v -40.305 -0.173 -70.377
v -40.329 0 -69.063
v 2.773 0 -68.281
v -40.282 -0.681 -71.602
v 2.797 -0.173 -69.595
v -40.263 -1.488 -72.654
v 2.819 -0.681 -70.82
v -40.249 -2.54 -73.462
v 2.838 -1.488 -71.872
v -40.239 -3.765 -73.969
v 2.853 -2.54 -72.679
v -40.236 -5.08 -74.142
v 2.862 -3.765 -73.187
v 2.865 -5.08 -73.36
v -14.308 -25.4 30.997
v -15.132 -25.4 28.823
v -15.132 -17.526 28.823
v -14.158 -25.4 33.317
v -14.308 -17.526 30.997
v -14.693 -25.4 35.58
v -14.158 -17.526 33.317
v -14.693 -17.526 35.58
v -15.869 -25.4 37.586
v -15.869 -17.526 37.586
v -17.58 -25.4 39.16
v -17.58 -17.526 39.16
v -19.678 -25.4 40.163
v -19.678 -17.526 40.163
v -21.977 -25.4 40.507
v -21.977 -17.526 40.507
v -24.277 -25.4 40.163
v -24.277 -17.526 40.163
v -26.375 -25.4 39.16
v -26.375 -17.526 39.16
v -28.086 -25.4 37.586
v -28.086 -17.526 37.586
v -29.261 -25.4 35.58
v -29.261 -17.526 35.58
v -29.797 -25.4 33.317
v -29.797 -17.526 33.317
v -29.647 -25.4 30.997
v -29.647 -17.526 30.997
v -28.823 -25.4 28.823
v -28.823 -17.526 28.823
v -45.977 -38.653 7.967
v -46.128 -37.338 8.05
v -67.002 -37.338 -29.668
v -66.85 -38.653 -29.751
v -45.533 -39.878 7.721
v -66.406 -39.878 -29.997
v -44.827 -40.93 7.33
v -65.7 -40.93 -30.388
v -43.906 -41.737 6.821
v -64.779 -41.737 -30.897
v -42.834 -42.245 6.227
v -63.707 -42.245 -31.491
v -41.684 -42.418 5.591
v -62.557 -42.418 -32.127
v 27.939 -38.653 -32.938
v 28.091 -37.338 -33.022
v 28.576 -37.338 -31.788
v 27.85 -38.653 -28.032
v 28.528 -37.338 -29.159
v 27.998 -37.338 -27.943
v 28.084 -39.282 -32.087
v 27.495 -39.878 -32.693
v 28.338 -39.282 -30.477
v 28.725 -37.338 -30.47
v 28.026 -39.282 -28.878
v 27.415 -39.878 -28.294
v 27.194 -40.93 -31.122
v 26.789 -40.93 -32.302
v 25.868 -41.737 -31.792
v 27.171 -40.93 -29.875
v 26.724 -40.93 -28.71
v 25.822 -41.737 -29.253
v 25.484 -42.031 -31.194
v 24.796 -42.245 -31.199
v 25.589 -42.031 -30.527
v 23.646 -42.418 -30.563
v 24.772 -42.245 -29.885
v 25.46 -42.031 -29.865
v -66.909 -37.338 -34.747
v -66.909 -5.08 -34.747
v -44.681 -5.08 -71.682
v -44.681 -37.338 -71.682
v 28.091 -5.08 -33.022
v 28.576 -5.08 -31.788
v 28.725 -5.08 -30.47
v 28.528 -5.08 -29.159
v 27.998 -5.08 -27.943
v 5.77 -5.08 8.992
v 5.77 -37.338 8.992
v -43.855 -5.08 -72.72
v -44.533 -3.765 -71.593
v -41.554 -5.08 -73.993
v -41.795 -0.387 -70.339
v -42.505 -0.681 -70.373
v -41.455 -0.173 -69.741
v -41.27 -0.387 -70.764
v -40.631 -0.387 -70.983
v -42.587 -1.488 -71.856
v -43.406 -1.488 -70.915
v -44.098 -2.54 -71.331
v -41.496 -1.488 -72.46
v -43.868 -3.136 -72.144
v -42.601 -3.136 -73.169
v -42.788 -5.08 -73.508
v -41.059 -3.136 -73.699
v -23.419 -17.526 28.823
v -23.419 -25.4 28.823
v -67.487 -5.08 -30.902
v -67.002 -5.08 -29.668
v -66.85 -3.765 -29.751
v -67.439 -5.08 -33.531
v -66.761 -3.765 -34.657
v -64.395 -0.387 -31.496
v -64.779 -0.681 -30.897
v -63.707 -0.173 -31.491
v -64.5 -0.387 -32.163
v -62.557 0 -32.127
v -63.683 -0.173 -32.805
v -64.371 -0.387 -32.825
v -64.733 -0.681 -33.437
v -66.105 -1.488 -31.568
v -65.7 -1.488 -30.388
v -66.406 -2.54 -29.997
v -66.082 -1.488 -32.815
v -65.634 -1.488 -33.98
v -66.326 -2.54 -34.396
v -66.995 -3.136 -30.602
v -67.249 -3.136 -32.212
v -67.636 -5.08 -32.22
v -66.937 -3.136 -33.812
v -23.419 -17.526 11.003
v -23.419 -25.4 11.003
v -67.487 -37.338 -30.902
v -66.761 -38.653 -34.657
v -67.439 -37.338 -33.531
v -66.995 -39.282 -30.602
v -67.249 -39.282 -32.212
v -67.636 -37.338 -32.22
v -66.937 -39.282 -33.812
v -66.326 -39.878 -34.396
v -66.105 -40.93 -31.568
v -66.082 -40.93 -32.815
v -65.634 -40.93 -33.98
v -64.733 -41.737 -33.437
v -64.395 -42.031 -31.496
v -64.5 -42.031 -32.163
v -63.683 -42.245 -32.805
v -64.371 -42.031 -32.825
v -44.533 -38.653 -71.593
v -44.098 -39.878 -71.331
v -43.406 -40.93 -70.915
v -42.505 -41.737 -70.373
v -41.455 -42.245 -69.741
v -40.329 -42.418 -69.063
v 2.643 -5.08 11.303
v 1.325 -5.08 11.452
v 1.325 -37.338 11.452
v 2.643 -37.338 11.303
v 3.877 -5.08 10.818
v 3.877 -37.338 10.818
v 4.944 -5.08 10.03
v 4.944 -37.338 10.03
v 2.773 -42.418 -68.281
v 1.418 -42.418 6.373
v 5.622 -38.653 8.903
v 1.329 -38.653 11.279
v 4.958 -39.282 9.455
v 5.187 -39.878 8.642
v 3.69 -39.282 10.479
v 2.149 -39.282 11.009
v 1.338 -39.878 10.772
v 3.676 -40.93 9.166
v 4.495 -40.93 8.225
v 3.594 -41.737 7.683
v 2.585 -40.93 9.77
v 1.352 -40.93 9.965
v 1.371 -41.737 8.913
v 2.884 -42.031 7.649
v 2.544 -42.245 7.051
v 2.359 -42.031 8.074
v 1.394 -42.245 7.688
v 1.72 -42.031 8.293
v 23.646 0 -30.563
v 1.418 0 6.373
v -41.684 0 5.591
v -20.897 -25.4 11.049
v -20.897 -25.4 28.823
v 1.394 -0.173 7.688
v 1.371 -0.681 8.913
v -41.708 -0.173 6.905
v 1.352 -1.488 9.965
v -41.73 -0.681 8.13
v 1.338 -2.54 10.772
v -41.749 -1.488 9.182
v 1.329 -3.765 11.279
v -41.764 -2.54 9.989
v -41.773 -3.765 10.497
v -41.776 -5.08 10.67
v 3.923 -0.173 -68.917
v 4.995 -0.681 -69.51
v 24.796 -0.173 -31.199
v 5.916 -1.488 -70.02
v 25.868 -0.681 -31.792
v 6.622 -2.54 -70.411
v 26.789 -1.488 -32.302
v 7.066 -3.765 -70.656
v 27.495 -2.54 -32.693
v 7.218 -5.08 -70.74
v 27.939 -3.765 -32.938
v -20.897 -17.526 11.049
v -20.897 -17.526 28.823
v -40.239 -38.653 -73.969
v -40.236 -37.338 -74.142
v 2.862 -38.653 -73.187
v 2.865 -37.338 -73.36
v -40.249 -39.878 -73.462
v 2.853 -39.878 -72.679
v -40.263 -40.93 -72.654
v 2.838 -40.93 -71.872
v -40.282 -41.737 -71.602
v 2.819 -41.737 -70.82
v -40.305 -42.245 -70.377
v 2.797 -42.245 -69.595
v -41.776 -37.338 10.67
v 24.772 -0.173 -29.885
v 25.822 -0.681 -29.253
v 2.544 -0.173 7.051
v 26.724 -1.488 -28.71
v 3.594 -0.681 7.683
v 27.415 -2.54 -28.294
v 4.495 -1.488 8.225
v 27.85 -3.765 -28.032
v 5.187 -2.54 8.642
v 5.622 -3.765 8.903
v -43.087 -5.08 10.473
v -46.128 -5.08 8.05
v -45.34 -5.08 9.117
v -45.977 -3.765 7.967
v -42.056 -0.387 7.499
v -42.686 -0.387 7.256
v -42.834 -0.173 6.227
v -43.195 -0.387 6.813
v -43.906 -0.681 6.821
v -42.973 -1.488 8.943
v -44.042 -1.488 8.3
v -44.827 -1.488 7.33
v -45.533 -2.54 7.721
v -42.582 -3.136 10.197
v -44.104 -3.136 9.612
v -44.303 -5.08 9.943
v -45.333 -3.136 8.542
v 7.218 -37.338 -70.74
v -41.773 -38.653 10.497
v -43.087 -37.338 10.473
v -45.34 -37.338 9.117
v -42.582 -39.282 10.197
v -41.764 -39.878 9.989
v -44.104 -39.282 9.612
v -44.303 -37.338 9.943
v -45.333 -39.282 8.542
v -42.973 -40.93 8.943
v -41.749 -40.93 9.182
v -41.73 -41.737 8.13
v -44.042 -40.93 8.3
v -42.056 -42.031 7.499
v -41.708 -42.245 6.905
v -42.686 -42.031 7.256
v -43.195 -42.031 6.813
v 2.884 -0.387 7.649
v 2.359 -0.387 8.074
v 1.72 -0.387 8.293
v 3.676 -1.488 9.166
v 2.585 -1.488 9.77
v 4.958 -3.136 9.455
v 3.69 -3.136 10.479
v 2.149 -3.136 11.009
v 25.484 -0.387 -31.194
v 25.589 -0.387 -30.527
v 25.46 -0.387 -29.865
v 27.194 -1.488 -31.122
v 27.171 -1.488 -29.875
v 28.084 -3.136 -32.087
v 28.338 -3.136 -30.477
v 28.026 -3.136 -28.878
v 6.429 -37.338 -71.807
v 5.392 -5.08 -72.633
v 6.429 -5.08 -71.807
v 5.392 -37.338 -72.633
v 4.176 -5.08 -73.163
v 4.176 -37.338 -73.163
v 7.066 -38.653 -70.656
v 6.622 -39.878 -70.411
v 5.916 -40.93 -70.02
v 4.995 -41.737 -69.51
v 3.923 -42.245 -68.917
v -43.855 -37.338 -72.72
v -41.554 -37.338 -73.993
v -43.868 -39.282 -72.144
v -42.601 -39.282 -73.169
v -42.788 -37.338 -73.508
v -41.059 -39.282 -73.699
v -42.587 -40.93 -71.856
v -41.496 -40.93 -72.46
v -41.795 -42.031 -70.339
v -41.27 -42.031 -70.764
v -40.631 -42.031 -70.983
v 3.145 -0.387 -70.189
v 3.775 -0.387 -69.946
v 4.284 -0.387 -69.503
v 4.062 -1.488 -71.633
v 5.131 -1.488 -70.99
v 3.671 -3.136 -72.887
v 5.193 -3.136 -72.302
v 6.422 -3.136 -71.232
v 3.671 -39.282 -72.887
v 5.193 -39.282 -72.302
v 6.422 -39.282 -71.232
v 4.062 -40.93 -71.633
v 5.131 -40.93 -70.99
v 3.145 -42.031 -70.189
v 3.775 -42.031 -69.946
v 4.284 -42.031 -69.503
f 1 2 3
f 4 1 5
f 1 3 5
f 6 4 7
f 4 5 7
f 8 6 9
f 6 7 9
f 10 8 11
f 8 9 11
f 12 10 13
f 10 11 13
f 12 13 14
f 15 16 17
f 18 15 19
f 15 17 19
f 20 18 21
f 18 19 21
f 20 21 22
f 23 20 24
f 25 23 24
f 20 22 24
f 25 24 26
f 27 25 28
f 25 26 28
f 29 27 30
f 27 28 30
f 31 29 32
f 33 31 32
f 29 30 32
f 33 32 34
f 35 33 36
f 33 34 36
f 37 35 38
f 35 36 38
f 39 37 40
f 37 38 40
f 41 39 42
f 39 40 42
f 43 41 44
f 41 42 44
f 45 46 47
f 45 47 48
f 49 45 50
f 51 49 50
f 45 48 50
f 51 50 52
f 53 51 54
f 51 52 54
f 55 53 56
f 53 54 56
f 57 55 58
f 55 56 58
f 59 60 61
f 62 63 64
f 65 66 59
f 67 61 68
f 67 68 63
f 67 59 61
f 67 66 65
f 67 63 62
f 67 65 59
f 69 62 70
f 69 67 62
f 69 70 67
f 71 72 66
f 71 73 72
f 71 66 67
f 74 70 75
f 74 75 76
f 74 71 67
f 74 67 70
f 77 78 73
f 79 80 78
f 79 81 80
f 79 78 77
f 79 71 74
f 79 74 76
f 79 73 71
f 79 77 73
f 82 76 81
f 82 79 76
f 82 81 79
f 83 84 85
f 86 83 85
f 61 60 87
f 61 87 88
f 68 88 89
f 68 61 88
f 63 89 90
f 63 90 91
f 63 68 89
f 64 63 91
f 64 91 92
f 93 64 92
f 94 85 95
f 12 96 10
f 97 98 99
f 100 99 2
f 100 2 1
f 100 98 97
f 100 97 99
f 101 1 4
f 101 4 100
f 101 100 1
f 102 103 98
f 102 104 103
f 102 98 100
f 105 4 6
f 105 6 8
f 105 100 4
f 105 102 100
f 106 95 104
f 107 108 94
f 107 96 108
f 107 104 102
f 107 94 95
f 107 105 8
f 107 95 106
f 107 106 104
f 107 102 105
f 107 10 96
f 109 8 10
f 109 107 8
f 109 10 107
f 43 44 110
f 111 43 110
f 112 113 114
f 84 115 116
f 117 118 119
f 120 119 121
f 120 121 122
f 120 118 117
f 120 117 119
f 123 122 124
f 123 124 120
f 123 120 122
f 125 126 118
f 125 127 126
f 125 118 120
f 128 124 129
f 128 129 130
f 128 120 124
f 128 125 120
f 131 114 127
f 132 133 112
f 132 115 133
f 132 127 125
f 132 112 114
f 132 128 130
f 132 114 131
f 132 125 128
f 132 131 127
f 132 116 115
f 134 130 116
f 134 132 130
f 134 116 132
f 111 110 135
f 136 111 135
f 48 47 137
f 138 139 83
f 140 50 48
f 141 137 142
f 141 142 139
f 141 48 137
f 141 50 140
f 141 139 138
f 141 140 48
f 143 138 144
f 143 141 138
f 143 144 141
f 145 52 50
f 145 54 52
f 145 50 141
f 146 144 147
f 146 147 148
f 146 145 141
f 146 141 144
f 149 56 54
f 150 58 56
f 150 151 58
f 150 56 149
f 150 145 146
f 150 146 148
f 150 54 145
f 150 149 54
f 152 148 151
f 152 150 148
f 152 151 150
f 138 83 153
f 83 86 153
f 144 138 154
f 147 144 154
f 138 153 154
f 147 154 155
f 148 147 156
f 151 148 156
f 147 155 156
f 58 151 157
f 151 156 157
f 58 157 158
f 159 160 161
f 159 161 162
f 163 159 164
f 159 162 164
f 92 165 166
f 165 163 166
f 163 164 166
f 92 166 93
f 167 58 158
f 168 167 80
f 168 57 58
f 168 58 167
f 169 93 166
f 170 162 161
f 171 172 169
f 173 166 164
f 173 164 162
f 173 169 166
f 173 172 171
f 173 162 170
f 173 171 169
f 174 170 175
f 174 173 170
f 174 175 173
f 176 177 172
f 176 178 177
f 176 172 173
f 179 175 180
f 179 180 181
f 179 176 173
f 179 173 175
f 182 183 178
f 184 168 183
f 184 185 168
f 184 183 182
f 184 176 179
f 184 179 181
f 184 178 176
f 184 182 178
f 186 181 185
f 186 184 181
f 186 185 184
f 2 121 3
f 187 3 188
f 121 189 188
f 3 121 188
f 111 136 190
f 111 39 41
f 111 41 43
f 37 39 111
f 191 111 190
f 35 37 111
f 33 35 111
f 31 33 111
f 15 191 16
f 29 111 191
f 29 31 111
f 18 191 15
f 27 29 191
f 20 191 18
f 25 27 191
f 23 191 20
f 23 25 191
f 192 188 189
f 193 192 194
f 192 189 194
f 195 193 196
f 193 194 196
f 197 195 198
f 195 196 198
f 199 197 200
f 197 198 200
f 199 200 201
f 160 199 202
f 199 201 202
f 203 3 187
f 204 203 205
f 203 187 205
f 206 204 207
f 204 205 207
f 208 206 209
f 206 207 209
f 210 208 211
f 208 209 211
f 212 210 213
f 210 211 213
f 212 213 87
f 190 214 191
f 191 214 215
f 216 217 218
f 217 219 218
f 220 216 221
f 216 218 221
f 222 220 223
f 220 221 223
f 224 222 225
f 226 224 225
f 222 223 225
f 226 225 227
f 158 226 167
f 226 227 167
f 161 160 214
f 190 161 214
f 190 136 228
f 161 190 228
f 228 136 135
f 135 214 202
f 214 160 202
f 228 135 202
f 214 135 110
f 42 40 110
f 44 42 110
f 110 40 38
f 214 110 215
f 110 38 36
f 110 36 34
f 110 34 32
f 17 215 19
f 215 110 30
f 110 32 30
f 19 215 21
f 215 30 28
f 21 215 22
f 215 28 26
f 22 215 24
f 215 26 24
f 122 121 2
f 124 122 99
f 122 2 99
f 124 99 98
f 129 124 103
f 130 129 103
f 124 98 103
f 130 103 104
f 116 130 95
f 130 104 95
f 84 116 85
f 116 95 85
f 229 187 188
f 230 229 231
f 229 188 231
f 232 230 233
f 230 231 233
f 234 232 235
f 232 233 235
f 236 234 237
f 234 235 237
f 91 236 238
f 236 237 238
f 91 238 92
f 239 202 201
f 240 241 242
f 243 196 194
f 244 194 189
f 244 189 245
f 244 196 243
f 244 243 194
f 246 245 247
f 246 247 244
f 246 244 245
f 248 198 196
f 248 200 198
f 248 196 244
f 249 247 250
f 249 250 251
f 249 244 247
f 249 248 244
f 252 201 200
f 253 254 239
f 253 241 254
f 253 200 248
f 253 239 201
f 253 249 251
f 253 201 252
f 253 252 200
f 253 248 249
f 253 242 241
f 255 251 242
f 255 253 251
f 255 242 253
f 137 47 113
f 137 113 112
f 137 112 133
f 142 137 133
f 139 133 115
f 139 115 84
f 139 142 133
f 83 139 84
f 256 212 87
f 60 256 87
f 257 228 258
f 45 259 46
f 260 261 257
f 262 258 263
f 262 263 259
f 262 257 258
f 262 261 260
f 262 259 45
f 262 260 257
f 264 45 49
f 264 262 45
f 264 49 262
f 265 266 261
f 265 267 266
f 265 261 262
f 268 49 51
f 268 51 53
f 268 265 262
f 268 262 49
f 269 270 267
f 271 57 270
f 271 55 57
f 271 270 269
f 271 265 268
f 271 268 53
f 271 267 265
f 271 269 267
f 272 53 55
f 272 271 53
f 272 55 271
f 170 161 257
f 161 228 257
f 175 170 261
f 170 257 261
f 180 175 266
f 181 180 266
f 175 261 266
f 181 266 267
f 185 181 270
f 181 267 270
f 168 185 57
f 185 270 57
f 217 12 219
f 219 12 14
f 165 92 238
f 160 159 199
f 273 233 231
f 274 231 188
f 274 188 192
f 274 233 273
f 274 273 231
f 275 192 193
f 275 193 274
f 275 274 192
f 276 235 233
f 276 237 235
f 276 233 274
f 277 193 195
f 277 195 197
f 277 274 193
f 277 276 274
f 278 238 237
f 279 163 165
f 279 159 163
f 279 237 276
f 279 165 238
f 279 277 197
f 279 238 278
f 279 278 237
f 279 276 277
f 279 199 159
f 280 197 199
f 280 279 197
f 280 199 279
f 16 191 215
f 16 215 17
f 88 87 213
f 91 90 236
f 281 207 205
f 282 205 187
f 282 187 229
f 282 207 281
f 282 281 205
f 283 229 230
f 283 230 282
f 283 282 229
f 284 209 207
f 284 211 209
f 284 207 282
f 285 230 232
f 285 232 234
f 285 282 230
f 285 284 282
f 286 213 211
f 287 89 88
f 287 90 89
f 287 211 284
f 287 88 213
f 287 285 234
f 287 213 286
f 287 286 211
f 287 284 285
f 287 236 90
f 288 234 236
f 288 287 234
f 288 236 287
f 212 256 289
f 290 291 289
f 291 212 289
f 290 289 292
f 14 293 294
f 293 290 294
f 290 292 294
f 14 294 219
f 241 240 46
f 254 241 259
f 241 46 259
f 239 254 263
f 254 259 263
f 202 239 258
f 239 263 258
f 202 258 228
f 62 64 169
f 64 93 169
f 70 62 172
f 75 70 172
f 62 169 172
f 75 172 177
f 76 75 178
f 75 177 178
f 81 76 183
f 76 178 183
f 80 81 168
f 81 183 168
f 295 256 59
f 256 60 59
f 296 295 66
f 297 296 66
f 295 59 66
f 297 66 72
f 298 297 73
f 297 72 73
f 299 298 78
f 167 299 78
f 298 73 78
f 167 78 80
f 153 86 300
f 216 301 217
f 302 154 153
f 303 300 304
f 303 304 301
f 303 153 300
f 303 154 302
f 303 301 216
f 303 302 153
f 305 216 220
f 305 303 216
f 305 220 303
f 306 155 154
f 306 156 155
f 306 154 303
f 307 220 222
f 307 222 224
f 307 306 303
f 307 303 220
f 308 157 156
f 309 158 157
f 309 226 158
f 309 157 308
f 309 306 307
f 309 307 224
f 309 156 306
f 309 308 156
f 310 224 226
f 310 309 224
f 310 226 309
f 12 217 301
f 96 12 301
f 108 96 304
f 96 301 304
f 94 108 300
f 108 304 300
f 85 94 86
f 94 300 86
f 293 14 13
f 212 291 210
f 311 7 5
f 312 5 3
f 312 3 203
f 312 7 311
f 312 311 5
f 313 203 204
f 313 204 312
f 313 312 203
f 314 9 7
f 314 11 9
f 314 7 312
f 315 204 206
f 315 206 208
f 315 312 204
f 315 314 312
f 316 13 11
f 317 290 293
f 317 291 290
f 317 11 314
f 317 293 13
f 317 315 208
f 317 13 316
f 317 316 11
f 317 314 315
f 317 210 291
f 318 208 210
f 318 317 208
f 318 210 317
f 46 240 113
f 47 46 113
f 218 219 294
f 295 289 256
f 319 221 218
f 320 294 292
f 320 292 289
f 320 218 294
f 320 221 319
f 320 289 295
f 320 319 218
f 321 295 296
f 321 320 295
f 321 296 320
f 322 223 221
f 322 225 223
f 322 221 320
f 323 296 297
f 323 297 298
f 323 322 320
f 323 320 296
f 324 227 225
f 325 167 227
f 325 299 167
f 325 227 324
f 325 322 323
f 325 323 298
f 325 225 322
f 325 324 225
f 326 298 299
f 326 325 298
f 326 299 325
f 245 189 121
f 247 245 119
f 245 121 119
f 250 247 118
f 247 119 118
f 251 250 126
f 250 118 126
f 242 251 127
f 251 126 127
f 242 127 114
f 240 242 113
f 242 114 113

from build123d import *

# Parameters (mm, degrees)
F1_DEPTH = 42.418
F3_START = 17.526
F3_DEPTH = 7.874
F4_F1_R  = 5.08
F4_F2_R  = 5.08
F4_F3_R  = 5.08
F4_F4_R  = 5.08
F4_F5_R  = 5.08
F4_F6_R  = 5.08
F4_F7_R  = 5.08
F4_F8_R  = 5.08


# Not quite as in the source:
# - a feature of the source that left no trace in its solid (it failed there, or was rolled back) is left out


with BuildPart() as f1:
    # F0 (on Front) → F1 (new body)
    with BuildSketch(Plane.XZ):
        Polygon((5.7973779566, -73.3064366429), (29.5106887989, -30.4560707957), (4.2578388349, 11.5054417251), (-44.7083219714, 10.6165883988), (-68.4216328137, -32.2337774485), (-43.1687828497, -74.1952899693), align=None)
    extrude(amount=F1_DEPTH)

    # F2 (on Front) → F3 (join)
    with BuildSketch(Plane.XZ.offset(F3_START)):
        Polygon((-23.4186239541, 28.8229137659), (-23.4186239541, 23.4186165035), (-23.4186239541, -51.1606782675), (-20.8966191858, -54.4032603502), (-20.8966191858, 28.8229137659), align=None)
        with BuildLine():
            Line((-28.8229212165, 28.8229137659), (-23.4186239541, 28.8229137659))
            Line((-23.4186239541, 28.8229137659), (-20.8966191858, 28.8229137659))
            Line((-20.8966191858, 28.8229137659), (-15.1320351288, 28.8229137659))
            ThreePointArc((-15.1320351288, 28.8229137659), (-21.9774781726, 40.5074513695), (-28.8229212165, 28.8229137659))
        make_face()
    extrude(amount=F3_DEPTH)

    # F4: fillet of radius 5.08 on 14 edges, made by hand

    # F4_f1
    f4_f1_edges = [f1.edges().sort_by_distance(p)[0] for p in [
        (5.7973779566, -21.209, -73.3064366429),
    ]]
    fillet(f4_f1_edges, radius=F4_F1_R)

    # F4_f2
    f4_f2_edges = [f1.edges().sort_by_distance(p)[0] for p in [
        (29.5106887989, -21.209, -30.4560707957),
    ]]
    fillet(f4_f2_edges, radius=F4_F2_R)

    # F4_f3
    f4_f3_edges = [f1.edges().sort_by_distance(p)[0] for p in [
        (-43.1687828497, -21.209, -74.1952899693),
    ]]
    fillet(f4_f3_edges, radius=F4_F3_R)

    # F4_f4
    f4_f4_edges = [f1.edges().sort_by_distance(p)[0] for p in [
        (4.2578388349, -21.209, 11.5054417251),
    ]]
    fillet(f4_f4_edges, radius=F4_F4_R)

    # F4_f5
    f4_f5_edges = [f1.edges().sort_by_distance(p)[0] for p in [
        (-68.4216328137, -21.209, -32.2337774485),
    ]]
    fillet(f4_f5_edges, radius=F4_F5_R)

    # F4_f6
    f4_f6_edges = [f1.edges().sort_by_distance(p)[0] for p in [
        (-44.7083219714, -21.209, 10.6165883988),
    ]]
    fillet(f4_f6_edges, radius=F4_F6_R)

    # F4_f7
    f4_f7_edges = [f1.edges().sort_by_distance(p)[0] for p in [
        (-55.7952078317, 0, -53.2145337089),
    ]]
    fillet(f4_f7_edges, radius=F4_F7_R)

    # F4_f8
    f4_f8_edges = [f1.edges().sort_by_distance(p)[0] for p in [
        (-55.7952078317, -42.418, -53.2145337089),
    ]]
    fillet(f4_f8_edges, radius=F4_F8_R)


solid = f1.part
